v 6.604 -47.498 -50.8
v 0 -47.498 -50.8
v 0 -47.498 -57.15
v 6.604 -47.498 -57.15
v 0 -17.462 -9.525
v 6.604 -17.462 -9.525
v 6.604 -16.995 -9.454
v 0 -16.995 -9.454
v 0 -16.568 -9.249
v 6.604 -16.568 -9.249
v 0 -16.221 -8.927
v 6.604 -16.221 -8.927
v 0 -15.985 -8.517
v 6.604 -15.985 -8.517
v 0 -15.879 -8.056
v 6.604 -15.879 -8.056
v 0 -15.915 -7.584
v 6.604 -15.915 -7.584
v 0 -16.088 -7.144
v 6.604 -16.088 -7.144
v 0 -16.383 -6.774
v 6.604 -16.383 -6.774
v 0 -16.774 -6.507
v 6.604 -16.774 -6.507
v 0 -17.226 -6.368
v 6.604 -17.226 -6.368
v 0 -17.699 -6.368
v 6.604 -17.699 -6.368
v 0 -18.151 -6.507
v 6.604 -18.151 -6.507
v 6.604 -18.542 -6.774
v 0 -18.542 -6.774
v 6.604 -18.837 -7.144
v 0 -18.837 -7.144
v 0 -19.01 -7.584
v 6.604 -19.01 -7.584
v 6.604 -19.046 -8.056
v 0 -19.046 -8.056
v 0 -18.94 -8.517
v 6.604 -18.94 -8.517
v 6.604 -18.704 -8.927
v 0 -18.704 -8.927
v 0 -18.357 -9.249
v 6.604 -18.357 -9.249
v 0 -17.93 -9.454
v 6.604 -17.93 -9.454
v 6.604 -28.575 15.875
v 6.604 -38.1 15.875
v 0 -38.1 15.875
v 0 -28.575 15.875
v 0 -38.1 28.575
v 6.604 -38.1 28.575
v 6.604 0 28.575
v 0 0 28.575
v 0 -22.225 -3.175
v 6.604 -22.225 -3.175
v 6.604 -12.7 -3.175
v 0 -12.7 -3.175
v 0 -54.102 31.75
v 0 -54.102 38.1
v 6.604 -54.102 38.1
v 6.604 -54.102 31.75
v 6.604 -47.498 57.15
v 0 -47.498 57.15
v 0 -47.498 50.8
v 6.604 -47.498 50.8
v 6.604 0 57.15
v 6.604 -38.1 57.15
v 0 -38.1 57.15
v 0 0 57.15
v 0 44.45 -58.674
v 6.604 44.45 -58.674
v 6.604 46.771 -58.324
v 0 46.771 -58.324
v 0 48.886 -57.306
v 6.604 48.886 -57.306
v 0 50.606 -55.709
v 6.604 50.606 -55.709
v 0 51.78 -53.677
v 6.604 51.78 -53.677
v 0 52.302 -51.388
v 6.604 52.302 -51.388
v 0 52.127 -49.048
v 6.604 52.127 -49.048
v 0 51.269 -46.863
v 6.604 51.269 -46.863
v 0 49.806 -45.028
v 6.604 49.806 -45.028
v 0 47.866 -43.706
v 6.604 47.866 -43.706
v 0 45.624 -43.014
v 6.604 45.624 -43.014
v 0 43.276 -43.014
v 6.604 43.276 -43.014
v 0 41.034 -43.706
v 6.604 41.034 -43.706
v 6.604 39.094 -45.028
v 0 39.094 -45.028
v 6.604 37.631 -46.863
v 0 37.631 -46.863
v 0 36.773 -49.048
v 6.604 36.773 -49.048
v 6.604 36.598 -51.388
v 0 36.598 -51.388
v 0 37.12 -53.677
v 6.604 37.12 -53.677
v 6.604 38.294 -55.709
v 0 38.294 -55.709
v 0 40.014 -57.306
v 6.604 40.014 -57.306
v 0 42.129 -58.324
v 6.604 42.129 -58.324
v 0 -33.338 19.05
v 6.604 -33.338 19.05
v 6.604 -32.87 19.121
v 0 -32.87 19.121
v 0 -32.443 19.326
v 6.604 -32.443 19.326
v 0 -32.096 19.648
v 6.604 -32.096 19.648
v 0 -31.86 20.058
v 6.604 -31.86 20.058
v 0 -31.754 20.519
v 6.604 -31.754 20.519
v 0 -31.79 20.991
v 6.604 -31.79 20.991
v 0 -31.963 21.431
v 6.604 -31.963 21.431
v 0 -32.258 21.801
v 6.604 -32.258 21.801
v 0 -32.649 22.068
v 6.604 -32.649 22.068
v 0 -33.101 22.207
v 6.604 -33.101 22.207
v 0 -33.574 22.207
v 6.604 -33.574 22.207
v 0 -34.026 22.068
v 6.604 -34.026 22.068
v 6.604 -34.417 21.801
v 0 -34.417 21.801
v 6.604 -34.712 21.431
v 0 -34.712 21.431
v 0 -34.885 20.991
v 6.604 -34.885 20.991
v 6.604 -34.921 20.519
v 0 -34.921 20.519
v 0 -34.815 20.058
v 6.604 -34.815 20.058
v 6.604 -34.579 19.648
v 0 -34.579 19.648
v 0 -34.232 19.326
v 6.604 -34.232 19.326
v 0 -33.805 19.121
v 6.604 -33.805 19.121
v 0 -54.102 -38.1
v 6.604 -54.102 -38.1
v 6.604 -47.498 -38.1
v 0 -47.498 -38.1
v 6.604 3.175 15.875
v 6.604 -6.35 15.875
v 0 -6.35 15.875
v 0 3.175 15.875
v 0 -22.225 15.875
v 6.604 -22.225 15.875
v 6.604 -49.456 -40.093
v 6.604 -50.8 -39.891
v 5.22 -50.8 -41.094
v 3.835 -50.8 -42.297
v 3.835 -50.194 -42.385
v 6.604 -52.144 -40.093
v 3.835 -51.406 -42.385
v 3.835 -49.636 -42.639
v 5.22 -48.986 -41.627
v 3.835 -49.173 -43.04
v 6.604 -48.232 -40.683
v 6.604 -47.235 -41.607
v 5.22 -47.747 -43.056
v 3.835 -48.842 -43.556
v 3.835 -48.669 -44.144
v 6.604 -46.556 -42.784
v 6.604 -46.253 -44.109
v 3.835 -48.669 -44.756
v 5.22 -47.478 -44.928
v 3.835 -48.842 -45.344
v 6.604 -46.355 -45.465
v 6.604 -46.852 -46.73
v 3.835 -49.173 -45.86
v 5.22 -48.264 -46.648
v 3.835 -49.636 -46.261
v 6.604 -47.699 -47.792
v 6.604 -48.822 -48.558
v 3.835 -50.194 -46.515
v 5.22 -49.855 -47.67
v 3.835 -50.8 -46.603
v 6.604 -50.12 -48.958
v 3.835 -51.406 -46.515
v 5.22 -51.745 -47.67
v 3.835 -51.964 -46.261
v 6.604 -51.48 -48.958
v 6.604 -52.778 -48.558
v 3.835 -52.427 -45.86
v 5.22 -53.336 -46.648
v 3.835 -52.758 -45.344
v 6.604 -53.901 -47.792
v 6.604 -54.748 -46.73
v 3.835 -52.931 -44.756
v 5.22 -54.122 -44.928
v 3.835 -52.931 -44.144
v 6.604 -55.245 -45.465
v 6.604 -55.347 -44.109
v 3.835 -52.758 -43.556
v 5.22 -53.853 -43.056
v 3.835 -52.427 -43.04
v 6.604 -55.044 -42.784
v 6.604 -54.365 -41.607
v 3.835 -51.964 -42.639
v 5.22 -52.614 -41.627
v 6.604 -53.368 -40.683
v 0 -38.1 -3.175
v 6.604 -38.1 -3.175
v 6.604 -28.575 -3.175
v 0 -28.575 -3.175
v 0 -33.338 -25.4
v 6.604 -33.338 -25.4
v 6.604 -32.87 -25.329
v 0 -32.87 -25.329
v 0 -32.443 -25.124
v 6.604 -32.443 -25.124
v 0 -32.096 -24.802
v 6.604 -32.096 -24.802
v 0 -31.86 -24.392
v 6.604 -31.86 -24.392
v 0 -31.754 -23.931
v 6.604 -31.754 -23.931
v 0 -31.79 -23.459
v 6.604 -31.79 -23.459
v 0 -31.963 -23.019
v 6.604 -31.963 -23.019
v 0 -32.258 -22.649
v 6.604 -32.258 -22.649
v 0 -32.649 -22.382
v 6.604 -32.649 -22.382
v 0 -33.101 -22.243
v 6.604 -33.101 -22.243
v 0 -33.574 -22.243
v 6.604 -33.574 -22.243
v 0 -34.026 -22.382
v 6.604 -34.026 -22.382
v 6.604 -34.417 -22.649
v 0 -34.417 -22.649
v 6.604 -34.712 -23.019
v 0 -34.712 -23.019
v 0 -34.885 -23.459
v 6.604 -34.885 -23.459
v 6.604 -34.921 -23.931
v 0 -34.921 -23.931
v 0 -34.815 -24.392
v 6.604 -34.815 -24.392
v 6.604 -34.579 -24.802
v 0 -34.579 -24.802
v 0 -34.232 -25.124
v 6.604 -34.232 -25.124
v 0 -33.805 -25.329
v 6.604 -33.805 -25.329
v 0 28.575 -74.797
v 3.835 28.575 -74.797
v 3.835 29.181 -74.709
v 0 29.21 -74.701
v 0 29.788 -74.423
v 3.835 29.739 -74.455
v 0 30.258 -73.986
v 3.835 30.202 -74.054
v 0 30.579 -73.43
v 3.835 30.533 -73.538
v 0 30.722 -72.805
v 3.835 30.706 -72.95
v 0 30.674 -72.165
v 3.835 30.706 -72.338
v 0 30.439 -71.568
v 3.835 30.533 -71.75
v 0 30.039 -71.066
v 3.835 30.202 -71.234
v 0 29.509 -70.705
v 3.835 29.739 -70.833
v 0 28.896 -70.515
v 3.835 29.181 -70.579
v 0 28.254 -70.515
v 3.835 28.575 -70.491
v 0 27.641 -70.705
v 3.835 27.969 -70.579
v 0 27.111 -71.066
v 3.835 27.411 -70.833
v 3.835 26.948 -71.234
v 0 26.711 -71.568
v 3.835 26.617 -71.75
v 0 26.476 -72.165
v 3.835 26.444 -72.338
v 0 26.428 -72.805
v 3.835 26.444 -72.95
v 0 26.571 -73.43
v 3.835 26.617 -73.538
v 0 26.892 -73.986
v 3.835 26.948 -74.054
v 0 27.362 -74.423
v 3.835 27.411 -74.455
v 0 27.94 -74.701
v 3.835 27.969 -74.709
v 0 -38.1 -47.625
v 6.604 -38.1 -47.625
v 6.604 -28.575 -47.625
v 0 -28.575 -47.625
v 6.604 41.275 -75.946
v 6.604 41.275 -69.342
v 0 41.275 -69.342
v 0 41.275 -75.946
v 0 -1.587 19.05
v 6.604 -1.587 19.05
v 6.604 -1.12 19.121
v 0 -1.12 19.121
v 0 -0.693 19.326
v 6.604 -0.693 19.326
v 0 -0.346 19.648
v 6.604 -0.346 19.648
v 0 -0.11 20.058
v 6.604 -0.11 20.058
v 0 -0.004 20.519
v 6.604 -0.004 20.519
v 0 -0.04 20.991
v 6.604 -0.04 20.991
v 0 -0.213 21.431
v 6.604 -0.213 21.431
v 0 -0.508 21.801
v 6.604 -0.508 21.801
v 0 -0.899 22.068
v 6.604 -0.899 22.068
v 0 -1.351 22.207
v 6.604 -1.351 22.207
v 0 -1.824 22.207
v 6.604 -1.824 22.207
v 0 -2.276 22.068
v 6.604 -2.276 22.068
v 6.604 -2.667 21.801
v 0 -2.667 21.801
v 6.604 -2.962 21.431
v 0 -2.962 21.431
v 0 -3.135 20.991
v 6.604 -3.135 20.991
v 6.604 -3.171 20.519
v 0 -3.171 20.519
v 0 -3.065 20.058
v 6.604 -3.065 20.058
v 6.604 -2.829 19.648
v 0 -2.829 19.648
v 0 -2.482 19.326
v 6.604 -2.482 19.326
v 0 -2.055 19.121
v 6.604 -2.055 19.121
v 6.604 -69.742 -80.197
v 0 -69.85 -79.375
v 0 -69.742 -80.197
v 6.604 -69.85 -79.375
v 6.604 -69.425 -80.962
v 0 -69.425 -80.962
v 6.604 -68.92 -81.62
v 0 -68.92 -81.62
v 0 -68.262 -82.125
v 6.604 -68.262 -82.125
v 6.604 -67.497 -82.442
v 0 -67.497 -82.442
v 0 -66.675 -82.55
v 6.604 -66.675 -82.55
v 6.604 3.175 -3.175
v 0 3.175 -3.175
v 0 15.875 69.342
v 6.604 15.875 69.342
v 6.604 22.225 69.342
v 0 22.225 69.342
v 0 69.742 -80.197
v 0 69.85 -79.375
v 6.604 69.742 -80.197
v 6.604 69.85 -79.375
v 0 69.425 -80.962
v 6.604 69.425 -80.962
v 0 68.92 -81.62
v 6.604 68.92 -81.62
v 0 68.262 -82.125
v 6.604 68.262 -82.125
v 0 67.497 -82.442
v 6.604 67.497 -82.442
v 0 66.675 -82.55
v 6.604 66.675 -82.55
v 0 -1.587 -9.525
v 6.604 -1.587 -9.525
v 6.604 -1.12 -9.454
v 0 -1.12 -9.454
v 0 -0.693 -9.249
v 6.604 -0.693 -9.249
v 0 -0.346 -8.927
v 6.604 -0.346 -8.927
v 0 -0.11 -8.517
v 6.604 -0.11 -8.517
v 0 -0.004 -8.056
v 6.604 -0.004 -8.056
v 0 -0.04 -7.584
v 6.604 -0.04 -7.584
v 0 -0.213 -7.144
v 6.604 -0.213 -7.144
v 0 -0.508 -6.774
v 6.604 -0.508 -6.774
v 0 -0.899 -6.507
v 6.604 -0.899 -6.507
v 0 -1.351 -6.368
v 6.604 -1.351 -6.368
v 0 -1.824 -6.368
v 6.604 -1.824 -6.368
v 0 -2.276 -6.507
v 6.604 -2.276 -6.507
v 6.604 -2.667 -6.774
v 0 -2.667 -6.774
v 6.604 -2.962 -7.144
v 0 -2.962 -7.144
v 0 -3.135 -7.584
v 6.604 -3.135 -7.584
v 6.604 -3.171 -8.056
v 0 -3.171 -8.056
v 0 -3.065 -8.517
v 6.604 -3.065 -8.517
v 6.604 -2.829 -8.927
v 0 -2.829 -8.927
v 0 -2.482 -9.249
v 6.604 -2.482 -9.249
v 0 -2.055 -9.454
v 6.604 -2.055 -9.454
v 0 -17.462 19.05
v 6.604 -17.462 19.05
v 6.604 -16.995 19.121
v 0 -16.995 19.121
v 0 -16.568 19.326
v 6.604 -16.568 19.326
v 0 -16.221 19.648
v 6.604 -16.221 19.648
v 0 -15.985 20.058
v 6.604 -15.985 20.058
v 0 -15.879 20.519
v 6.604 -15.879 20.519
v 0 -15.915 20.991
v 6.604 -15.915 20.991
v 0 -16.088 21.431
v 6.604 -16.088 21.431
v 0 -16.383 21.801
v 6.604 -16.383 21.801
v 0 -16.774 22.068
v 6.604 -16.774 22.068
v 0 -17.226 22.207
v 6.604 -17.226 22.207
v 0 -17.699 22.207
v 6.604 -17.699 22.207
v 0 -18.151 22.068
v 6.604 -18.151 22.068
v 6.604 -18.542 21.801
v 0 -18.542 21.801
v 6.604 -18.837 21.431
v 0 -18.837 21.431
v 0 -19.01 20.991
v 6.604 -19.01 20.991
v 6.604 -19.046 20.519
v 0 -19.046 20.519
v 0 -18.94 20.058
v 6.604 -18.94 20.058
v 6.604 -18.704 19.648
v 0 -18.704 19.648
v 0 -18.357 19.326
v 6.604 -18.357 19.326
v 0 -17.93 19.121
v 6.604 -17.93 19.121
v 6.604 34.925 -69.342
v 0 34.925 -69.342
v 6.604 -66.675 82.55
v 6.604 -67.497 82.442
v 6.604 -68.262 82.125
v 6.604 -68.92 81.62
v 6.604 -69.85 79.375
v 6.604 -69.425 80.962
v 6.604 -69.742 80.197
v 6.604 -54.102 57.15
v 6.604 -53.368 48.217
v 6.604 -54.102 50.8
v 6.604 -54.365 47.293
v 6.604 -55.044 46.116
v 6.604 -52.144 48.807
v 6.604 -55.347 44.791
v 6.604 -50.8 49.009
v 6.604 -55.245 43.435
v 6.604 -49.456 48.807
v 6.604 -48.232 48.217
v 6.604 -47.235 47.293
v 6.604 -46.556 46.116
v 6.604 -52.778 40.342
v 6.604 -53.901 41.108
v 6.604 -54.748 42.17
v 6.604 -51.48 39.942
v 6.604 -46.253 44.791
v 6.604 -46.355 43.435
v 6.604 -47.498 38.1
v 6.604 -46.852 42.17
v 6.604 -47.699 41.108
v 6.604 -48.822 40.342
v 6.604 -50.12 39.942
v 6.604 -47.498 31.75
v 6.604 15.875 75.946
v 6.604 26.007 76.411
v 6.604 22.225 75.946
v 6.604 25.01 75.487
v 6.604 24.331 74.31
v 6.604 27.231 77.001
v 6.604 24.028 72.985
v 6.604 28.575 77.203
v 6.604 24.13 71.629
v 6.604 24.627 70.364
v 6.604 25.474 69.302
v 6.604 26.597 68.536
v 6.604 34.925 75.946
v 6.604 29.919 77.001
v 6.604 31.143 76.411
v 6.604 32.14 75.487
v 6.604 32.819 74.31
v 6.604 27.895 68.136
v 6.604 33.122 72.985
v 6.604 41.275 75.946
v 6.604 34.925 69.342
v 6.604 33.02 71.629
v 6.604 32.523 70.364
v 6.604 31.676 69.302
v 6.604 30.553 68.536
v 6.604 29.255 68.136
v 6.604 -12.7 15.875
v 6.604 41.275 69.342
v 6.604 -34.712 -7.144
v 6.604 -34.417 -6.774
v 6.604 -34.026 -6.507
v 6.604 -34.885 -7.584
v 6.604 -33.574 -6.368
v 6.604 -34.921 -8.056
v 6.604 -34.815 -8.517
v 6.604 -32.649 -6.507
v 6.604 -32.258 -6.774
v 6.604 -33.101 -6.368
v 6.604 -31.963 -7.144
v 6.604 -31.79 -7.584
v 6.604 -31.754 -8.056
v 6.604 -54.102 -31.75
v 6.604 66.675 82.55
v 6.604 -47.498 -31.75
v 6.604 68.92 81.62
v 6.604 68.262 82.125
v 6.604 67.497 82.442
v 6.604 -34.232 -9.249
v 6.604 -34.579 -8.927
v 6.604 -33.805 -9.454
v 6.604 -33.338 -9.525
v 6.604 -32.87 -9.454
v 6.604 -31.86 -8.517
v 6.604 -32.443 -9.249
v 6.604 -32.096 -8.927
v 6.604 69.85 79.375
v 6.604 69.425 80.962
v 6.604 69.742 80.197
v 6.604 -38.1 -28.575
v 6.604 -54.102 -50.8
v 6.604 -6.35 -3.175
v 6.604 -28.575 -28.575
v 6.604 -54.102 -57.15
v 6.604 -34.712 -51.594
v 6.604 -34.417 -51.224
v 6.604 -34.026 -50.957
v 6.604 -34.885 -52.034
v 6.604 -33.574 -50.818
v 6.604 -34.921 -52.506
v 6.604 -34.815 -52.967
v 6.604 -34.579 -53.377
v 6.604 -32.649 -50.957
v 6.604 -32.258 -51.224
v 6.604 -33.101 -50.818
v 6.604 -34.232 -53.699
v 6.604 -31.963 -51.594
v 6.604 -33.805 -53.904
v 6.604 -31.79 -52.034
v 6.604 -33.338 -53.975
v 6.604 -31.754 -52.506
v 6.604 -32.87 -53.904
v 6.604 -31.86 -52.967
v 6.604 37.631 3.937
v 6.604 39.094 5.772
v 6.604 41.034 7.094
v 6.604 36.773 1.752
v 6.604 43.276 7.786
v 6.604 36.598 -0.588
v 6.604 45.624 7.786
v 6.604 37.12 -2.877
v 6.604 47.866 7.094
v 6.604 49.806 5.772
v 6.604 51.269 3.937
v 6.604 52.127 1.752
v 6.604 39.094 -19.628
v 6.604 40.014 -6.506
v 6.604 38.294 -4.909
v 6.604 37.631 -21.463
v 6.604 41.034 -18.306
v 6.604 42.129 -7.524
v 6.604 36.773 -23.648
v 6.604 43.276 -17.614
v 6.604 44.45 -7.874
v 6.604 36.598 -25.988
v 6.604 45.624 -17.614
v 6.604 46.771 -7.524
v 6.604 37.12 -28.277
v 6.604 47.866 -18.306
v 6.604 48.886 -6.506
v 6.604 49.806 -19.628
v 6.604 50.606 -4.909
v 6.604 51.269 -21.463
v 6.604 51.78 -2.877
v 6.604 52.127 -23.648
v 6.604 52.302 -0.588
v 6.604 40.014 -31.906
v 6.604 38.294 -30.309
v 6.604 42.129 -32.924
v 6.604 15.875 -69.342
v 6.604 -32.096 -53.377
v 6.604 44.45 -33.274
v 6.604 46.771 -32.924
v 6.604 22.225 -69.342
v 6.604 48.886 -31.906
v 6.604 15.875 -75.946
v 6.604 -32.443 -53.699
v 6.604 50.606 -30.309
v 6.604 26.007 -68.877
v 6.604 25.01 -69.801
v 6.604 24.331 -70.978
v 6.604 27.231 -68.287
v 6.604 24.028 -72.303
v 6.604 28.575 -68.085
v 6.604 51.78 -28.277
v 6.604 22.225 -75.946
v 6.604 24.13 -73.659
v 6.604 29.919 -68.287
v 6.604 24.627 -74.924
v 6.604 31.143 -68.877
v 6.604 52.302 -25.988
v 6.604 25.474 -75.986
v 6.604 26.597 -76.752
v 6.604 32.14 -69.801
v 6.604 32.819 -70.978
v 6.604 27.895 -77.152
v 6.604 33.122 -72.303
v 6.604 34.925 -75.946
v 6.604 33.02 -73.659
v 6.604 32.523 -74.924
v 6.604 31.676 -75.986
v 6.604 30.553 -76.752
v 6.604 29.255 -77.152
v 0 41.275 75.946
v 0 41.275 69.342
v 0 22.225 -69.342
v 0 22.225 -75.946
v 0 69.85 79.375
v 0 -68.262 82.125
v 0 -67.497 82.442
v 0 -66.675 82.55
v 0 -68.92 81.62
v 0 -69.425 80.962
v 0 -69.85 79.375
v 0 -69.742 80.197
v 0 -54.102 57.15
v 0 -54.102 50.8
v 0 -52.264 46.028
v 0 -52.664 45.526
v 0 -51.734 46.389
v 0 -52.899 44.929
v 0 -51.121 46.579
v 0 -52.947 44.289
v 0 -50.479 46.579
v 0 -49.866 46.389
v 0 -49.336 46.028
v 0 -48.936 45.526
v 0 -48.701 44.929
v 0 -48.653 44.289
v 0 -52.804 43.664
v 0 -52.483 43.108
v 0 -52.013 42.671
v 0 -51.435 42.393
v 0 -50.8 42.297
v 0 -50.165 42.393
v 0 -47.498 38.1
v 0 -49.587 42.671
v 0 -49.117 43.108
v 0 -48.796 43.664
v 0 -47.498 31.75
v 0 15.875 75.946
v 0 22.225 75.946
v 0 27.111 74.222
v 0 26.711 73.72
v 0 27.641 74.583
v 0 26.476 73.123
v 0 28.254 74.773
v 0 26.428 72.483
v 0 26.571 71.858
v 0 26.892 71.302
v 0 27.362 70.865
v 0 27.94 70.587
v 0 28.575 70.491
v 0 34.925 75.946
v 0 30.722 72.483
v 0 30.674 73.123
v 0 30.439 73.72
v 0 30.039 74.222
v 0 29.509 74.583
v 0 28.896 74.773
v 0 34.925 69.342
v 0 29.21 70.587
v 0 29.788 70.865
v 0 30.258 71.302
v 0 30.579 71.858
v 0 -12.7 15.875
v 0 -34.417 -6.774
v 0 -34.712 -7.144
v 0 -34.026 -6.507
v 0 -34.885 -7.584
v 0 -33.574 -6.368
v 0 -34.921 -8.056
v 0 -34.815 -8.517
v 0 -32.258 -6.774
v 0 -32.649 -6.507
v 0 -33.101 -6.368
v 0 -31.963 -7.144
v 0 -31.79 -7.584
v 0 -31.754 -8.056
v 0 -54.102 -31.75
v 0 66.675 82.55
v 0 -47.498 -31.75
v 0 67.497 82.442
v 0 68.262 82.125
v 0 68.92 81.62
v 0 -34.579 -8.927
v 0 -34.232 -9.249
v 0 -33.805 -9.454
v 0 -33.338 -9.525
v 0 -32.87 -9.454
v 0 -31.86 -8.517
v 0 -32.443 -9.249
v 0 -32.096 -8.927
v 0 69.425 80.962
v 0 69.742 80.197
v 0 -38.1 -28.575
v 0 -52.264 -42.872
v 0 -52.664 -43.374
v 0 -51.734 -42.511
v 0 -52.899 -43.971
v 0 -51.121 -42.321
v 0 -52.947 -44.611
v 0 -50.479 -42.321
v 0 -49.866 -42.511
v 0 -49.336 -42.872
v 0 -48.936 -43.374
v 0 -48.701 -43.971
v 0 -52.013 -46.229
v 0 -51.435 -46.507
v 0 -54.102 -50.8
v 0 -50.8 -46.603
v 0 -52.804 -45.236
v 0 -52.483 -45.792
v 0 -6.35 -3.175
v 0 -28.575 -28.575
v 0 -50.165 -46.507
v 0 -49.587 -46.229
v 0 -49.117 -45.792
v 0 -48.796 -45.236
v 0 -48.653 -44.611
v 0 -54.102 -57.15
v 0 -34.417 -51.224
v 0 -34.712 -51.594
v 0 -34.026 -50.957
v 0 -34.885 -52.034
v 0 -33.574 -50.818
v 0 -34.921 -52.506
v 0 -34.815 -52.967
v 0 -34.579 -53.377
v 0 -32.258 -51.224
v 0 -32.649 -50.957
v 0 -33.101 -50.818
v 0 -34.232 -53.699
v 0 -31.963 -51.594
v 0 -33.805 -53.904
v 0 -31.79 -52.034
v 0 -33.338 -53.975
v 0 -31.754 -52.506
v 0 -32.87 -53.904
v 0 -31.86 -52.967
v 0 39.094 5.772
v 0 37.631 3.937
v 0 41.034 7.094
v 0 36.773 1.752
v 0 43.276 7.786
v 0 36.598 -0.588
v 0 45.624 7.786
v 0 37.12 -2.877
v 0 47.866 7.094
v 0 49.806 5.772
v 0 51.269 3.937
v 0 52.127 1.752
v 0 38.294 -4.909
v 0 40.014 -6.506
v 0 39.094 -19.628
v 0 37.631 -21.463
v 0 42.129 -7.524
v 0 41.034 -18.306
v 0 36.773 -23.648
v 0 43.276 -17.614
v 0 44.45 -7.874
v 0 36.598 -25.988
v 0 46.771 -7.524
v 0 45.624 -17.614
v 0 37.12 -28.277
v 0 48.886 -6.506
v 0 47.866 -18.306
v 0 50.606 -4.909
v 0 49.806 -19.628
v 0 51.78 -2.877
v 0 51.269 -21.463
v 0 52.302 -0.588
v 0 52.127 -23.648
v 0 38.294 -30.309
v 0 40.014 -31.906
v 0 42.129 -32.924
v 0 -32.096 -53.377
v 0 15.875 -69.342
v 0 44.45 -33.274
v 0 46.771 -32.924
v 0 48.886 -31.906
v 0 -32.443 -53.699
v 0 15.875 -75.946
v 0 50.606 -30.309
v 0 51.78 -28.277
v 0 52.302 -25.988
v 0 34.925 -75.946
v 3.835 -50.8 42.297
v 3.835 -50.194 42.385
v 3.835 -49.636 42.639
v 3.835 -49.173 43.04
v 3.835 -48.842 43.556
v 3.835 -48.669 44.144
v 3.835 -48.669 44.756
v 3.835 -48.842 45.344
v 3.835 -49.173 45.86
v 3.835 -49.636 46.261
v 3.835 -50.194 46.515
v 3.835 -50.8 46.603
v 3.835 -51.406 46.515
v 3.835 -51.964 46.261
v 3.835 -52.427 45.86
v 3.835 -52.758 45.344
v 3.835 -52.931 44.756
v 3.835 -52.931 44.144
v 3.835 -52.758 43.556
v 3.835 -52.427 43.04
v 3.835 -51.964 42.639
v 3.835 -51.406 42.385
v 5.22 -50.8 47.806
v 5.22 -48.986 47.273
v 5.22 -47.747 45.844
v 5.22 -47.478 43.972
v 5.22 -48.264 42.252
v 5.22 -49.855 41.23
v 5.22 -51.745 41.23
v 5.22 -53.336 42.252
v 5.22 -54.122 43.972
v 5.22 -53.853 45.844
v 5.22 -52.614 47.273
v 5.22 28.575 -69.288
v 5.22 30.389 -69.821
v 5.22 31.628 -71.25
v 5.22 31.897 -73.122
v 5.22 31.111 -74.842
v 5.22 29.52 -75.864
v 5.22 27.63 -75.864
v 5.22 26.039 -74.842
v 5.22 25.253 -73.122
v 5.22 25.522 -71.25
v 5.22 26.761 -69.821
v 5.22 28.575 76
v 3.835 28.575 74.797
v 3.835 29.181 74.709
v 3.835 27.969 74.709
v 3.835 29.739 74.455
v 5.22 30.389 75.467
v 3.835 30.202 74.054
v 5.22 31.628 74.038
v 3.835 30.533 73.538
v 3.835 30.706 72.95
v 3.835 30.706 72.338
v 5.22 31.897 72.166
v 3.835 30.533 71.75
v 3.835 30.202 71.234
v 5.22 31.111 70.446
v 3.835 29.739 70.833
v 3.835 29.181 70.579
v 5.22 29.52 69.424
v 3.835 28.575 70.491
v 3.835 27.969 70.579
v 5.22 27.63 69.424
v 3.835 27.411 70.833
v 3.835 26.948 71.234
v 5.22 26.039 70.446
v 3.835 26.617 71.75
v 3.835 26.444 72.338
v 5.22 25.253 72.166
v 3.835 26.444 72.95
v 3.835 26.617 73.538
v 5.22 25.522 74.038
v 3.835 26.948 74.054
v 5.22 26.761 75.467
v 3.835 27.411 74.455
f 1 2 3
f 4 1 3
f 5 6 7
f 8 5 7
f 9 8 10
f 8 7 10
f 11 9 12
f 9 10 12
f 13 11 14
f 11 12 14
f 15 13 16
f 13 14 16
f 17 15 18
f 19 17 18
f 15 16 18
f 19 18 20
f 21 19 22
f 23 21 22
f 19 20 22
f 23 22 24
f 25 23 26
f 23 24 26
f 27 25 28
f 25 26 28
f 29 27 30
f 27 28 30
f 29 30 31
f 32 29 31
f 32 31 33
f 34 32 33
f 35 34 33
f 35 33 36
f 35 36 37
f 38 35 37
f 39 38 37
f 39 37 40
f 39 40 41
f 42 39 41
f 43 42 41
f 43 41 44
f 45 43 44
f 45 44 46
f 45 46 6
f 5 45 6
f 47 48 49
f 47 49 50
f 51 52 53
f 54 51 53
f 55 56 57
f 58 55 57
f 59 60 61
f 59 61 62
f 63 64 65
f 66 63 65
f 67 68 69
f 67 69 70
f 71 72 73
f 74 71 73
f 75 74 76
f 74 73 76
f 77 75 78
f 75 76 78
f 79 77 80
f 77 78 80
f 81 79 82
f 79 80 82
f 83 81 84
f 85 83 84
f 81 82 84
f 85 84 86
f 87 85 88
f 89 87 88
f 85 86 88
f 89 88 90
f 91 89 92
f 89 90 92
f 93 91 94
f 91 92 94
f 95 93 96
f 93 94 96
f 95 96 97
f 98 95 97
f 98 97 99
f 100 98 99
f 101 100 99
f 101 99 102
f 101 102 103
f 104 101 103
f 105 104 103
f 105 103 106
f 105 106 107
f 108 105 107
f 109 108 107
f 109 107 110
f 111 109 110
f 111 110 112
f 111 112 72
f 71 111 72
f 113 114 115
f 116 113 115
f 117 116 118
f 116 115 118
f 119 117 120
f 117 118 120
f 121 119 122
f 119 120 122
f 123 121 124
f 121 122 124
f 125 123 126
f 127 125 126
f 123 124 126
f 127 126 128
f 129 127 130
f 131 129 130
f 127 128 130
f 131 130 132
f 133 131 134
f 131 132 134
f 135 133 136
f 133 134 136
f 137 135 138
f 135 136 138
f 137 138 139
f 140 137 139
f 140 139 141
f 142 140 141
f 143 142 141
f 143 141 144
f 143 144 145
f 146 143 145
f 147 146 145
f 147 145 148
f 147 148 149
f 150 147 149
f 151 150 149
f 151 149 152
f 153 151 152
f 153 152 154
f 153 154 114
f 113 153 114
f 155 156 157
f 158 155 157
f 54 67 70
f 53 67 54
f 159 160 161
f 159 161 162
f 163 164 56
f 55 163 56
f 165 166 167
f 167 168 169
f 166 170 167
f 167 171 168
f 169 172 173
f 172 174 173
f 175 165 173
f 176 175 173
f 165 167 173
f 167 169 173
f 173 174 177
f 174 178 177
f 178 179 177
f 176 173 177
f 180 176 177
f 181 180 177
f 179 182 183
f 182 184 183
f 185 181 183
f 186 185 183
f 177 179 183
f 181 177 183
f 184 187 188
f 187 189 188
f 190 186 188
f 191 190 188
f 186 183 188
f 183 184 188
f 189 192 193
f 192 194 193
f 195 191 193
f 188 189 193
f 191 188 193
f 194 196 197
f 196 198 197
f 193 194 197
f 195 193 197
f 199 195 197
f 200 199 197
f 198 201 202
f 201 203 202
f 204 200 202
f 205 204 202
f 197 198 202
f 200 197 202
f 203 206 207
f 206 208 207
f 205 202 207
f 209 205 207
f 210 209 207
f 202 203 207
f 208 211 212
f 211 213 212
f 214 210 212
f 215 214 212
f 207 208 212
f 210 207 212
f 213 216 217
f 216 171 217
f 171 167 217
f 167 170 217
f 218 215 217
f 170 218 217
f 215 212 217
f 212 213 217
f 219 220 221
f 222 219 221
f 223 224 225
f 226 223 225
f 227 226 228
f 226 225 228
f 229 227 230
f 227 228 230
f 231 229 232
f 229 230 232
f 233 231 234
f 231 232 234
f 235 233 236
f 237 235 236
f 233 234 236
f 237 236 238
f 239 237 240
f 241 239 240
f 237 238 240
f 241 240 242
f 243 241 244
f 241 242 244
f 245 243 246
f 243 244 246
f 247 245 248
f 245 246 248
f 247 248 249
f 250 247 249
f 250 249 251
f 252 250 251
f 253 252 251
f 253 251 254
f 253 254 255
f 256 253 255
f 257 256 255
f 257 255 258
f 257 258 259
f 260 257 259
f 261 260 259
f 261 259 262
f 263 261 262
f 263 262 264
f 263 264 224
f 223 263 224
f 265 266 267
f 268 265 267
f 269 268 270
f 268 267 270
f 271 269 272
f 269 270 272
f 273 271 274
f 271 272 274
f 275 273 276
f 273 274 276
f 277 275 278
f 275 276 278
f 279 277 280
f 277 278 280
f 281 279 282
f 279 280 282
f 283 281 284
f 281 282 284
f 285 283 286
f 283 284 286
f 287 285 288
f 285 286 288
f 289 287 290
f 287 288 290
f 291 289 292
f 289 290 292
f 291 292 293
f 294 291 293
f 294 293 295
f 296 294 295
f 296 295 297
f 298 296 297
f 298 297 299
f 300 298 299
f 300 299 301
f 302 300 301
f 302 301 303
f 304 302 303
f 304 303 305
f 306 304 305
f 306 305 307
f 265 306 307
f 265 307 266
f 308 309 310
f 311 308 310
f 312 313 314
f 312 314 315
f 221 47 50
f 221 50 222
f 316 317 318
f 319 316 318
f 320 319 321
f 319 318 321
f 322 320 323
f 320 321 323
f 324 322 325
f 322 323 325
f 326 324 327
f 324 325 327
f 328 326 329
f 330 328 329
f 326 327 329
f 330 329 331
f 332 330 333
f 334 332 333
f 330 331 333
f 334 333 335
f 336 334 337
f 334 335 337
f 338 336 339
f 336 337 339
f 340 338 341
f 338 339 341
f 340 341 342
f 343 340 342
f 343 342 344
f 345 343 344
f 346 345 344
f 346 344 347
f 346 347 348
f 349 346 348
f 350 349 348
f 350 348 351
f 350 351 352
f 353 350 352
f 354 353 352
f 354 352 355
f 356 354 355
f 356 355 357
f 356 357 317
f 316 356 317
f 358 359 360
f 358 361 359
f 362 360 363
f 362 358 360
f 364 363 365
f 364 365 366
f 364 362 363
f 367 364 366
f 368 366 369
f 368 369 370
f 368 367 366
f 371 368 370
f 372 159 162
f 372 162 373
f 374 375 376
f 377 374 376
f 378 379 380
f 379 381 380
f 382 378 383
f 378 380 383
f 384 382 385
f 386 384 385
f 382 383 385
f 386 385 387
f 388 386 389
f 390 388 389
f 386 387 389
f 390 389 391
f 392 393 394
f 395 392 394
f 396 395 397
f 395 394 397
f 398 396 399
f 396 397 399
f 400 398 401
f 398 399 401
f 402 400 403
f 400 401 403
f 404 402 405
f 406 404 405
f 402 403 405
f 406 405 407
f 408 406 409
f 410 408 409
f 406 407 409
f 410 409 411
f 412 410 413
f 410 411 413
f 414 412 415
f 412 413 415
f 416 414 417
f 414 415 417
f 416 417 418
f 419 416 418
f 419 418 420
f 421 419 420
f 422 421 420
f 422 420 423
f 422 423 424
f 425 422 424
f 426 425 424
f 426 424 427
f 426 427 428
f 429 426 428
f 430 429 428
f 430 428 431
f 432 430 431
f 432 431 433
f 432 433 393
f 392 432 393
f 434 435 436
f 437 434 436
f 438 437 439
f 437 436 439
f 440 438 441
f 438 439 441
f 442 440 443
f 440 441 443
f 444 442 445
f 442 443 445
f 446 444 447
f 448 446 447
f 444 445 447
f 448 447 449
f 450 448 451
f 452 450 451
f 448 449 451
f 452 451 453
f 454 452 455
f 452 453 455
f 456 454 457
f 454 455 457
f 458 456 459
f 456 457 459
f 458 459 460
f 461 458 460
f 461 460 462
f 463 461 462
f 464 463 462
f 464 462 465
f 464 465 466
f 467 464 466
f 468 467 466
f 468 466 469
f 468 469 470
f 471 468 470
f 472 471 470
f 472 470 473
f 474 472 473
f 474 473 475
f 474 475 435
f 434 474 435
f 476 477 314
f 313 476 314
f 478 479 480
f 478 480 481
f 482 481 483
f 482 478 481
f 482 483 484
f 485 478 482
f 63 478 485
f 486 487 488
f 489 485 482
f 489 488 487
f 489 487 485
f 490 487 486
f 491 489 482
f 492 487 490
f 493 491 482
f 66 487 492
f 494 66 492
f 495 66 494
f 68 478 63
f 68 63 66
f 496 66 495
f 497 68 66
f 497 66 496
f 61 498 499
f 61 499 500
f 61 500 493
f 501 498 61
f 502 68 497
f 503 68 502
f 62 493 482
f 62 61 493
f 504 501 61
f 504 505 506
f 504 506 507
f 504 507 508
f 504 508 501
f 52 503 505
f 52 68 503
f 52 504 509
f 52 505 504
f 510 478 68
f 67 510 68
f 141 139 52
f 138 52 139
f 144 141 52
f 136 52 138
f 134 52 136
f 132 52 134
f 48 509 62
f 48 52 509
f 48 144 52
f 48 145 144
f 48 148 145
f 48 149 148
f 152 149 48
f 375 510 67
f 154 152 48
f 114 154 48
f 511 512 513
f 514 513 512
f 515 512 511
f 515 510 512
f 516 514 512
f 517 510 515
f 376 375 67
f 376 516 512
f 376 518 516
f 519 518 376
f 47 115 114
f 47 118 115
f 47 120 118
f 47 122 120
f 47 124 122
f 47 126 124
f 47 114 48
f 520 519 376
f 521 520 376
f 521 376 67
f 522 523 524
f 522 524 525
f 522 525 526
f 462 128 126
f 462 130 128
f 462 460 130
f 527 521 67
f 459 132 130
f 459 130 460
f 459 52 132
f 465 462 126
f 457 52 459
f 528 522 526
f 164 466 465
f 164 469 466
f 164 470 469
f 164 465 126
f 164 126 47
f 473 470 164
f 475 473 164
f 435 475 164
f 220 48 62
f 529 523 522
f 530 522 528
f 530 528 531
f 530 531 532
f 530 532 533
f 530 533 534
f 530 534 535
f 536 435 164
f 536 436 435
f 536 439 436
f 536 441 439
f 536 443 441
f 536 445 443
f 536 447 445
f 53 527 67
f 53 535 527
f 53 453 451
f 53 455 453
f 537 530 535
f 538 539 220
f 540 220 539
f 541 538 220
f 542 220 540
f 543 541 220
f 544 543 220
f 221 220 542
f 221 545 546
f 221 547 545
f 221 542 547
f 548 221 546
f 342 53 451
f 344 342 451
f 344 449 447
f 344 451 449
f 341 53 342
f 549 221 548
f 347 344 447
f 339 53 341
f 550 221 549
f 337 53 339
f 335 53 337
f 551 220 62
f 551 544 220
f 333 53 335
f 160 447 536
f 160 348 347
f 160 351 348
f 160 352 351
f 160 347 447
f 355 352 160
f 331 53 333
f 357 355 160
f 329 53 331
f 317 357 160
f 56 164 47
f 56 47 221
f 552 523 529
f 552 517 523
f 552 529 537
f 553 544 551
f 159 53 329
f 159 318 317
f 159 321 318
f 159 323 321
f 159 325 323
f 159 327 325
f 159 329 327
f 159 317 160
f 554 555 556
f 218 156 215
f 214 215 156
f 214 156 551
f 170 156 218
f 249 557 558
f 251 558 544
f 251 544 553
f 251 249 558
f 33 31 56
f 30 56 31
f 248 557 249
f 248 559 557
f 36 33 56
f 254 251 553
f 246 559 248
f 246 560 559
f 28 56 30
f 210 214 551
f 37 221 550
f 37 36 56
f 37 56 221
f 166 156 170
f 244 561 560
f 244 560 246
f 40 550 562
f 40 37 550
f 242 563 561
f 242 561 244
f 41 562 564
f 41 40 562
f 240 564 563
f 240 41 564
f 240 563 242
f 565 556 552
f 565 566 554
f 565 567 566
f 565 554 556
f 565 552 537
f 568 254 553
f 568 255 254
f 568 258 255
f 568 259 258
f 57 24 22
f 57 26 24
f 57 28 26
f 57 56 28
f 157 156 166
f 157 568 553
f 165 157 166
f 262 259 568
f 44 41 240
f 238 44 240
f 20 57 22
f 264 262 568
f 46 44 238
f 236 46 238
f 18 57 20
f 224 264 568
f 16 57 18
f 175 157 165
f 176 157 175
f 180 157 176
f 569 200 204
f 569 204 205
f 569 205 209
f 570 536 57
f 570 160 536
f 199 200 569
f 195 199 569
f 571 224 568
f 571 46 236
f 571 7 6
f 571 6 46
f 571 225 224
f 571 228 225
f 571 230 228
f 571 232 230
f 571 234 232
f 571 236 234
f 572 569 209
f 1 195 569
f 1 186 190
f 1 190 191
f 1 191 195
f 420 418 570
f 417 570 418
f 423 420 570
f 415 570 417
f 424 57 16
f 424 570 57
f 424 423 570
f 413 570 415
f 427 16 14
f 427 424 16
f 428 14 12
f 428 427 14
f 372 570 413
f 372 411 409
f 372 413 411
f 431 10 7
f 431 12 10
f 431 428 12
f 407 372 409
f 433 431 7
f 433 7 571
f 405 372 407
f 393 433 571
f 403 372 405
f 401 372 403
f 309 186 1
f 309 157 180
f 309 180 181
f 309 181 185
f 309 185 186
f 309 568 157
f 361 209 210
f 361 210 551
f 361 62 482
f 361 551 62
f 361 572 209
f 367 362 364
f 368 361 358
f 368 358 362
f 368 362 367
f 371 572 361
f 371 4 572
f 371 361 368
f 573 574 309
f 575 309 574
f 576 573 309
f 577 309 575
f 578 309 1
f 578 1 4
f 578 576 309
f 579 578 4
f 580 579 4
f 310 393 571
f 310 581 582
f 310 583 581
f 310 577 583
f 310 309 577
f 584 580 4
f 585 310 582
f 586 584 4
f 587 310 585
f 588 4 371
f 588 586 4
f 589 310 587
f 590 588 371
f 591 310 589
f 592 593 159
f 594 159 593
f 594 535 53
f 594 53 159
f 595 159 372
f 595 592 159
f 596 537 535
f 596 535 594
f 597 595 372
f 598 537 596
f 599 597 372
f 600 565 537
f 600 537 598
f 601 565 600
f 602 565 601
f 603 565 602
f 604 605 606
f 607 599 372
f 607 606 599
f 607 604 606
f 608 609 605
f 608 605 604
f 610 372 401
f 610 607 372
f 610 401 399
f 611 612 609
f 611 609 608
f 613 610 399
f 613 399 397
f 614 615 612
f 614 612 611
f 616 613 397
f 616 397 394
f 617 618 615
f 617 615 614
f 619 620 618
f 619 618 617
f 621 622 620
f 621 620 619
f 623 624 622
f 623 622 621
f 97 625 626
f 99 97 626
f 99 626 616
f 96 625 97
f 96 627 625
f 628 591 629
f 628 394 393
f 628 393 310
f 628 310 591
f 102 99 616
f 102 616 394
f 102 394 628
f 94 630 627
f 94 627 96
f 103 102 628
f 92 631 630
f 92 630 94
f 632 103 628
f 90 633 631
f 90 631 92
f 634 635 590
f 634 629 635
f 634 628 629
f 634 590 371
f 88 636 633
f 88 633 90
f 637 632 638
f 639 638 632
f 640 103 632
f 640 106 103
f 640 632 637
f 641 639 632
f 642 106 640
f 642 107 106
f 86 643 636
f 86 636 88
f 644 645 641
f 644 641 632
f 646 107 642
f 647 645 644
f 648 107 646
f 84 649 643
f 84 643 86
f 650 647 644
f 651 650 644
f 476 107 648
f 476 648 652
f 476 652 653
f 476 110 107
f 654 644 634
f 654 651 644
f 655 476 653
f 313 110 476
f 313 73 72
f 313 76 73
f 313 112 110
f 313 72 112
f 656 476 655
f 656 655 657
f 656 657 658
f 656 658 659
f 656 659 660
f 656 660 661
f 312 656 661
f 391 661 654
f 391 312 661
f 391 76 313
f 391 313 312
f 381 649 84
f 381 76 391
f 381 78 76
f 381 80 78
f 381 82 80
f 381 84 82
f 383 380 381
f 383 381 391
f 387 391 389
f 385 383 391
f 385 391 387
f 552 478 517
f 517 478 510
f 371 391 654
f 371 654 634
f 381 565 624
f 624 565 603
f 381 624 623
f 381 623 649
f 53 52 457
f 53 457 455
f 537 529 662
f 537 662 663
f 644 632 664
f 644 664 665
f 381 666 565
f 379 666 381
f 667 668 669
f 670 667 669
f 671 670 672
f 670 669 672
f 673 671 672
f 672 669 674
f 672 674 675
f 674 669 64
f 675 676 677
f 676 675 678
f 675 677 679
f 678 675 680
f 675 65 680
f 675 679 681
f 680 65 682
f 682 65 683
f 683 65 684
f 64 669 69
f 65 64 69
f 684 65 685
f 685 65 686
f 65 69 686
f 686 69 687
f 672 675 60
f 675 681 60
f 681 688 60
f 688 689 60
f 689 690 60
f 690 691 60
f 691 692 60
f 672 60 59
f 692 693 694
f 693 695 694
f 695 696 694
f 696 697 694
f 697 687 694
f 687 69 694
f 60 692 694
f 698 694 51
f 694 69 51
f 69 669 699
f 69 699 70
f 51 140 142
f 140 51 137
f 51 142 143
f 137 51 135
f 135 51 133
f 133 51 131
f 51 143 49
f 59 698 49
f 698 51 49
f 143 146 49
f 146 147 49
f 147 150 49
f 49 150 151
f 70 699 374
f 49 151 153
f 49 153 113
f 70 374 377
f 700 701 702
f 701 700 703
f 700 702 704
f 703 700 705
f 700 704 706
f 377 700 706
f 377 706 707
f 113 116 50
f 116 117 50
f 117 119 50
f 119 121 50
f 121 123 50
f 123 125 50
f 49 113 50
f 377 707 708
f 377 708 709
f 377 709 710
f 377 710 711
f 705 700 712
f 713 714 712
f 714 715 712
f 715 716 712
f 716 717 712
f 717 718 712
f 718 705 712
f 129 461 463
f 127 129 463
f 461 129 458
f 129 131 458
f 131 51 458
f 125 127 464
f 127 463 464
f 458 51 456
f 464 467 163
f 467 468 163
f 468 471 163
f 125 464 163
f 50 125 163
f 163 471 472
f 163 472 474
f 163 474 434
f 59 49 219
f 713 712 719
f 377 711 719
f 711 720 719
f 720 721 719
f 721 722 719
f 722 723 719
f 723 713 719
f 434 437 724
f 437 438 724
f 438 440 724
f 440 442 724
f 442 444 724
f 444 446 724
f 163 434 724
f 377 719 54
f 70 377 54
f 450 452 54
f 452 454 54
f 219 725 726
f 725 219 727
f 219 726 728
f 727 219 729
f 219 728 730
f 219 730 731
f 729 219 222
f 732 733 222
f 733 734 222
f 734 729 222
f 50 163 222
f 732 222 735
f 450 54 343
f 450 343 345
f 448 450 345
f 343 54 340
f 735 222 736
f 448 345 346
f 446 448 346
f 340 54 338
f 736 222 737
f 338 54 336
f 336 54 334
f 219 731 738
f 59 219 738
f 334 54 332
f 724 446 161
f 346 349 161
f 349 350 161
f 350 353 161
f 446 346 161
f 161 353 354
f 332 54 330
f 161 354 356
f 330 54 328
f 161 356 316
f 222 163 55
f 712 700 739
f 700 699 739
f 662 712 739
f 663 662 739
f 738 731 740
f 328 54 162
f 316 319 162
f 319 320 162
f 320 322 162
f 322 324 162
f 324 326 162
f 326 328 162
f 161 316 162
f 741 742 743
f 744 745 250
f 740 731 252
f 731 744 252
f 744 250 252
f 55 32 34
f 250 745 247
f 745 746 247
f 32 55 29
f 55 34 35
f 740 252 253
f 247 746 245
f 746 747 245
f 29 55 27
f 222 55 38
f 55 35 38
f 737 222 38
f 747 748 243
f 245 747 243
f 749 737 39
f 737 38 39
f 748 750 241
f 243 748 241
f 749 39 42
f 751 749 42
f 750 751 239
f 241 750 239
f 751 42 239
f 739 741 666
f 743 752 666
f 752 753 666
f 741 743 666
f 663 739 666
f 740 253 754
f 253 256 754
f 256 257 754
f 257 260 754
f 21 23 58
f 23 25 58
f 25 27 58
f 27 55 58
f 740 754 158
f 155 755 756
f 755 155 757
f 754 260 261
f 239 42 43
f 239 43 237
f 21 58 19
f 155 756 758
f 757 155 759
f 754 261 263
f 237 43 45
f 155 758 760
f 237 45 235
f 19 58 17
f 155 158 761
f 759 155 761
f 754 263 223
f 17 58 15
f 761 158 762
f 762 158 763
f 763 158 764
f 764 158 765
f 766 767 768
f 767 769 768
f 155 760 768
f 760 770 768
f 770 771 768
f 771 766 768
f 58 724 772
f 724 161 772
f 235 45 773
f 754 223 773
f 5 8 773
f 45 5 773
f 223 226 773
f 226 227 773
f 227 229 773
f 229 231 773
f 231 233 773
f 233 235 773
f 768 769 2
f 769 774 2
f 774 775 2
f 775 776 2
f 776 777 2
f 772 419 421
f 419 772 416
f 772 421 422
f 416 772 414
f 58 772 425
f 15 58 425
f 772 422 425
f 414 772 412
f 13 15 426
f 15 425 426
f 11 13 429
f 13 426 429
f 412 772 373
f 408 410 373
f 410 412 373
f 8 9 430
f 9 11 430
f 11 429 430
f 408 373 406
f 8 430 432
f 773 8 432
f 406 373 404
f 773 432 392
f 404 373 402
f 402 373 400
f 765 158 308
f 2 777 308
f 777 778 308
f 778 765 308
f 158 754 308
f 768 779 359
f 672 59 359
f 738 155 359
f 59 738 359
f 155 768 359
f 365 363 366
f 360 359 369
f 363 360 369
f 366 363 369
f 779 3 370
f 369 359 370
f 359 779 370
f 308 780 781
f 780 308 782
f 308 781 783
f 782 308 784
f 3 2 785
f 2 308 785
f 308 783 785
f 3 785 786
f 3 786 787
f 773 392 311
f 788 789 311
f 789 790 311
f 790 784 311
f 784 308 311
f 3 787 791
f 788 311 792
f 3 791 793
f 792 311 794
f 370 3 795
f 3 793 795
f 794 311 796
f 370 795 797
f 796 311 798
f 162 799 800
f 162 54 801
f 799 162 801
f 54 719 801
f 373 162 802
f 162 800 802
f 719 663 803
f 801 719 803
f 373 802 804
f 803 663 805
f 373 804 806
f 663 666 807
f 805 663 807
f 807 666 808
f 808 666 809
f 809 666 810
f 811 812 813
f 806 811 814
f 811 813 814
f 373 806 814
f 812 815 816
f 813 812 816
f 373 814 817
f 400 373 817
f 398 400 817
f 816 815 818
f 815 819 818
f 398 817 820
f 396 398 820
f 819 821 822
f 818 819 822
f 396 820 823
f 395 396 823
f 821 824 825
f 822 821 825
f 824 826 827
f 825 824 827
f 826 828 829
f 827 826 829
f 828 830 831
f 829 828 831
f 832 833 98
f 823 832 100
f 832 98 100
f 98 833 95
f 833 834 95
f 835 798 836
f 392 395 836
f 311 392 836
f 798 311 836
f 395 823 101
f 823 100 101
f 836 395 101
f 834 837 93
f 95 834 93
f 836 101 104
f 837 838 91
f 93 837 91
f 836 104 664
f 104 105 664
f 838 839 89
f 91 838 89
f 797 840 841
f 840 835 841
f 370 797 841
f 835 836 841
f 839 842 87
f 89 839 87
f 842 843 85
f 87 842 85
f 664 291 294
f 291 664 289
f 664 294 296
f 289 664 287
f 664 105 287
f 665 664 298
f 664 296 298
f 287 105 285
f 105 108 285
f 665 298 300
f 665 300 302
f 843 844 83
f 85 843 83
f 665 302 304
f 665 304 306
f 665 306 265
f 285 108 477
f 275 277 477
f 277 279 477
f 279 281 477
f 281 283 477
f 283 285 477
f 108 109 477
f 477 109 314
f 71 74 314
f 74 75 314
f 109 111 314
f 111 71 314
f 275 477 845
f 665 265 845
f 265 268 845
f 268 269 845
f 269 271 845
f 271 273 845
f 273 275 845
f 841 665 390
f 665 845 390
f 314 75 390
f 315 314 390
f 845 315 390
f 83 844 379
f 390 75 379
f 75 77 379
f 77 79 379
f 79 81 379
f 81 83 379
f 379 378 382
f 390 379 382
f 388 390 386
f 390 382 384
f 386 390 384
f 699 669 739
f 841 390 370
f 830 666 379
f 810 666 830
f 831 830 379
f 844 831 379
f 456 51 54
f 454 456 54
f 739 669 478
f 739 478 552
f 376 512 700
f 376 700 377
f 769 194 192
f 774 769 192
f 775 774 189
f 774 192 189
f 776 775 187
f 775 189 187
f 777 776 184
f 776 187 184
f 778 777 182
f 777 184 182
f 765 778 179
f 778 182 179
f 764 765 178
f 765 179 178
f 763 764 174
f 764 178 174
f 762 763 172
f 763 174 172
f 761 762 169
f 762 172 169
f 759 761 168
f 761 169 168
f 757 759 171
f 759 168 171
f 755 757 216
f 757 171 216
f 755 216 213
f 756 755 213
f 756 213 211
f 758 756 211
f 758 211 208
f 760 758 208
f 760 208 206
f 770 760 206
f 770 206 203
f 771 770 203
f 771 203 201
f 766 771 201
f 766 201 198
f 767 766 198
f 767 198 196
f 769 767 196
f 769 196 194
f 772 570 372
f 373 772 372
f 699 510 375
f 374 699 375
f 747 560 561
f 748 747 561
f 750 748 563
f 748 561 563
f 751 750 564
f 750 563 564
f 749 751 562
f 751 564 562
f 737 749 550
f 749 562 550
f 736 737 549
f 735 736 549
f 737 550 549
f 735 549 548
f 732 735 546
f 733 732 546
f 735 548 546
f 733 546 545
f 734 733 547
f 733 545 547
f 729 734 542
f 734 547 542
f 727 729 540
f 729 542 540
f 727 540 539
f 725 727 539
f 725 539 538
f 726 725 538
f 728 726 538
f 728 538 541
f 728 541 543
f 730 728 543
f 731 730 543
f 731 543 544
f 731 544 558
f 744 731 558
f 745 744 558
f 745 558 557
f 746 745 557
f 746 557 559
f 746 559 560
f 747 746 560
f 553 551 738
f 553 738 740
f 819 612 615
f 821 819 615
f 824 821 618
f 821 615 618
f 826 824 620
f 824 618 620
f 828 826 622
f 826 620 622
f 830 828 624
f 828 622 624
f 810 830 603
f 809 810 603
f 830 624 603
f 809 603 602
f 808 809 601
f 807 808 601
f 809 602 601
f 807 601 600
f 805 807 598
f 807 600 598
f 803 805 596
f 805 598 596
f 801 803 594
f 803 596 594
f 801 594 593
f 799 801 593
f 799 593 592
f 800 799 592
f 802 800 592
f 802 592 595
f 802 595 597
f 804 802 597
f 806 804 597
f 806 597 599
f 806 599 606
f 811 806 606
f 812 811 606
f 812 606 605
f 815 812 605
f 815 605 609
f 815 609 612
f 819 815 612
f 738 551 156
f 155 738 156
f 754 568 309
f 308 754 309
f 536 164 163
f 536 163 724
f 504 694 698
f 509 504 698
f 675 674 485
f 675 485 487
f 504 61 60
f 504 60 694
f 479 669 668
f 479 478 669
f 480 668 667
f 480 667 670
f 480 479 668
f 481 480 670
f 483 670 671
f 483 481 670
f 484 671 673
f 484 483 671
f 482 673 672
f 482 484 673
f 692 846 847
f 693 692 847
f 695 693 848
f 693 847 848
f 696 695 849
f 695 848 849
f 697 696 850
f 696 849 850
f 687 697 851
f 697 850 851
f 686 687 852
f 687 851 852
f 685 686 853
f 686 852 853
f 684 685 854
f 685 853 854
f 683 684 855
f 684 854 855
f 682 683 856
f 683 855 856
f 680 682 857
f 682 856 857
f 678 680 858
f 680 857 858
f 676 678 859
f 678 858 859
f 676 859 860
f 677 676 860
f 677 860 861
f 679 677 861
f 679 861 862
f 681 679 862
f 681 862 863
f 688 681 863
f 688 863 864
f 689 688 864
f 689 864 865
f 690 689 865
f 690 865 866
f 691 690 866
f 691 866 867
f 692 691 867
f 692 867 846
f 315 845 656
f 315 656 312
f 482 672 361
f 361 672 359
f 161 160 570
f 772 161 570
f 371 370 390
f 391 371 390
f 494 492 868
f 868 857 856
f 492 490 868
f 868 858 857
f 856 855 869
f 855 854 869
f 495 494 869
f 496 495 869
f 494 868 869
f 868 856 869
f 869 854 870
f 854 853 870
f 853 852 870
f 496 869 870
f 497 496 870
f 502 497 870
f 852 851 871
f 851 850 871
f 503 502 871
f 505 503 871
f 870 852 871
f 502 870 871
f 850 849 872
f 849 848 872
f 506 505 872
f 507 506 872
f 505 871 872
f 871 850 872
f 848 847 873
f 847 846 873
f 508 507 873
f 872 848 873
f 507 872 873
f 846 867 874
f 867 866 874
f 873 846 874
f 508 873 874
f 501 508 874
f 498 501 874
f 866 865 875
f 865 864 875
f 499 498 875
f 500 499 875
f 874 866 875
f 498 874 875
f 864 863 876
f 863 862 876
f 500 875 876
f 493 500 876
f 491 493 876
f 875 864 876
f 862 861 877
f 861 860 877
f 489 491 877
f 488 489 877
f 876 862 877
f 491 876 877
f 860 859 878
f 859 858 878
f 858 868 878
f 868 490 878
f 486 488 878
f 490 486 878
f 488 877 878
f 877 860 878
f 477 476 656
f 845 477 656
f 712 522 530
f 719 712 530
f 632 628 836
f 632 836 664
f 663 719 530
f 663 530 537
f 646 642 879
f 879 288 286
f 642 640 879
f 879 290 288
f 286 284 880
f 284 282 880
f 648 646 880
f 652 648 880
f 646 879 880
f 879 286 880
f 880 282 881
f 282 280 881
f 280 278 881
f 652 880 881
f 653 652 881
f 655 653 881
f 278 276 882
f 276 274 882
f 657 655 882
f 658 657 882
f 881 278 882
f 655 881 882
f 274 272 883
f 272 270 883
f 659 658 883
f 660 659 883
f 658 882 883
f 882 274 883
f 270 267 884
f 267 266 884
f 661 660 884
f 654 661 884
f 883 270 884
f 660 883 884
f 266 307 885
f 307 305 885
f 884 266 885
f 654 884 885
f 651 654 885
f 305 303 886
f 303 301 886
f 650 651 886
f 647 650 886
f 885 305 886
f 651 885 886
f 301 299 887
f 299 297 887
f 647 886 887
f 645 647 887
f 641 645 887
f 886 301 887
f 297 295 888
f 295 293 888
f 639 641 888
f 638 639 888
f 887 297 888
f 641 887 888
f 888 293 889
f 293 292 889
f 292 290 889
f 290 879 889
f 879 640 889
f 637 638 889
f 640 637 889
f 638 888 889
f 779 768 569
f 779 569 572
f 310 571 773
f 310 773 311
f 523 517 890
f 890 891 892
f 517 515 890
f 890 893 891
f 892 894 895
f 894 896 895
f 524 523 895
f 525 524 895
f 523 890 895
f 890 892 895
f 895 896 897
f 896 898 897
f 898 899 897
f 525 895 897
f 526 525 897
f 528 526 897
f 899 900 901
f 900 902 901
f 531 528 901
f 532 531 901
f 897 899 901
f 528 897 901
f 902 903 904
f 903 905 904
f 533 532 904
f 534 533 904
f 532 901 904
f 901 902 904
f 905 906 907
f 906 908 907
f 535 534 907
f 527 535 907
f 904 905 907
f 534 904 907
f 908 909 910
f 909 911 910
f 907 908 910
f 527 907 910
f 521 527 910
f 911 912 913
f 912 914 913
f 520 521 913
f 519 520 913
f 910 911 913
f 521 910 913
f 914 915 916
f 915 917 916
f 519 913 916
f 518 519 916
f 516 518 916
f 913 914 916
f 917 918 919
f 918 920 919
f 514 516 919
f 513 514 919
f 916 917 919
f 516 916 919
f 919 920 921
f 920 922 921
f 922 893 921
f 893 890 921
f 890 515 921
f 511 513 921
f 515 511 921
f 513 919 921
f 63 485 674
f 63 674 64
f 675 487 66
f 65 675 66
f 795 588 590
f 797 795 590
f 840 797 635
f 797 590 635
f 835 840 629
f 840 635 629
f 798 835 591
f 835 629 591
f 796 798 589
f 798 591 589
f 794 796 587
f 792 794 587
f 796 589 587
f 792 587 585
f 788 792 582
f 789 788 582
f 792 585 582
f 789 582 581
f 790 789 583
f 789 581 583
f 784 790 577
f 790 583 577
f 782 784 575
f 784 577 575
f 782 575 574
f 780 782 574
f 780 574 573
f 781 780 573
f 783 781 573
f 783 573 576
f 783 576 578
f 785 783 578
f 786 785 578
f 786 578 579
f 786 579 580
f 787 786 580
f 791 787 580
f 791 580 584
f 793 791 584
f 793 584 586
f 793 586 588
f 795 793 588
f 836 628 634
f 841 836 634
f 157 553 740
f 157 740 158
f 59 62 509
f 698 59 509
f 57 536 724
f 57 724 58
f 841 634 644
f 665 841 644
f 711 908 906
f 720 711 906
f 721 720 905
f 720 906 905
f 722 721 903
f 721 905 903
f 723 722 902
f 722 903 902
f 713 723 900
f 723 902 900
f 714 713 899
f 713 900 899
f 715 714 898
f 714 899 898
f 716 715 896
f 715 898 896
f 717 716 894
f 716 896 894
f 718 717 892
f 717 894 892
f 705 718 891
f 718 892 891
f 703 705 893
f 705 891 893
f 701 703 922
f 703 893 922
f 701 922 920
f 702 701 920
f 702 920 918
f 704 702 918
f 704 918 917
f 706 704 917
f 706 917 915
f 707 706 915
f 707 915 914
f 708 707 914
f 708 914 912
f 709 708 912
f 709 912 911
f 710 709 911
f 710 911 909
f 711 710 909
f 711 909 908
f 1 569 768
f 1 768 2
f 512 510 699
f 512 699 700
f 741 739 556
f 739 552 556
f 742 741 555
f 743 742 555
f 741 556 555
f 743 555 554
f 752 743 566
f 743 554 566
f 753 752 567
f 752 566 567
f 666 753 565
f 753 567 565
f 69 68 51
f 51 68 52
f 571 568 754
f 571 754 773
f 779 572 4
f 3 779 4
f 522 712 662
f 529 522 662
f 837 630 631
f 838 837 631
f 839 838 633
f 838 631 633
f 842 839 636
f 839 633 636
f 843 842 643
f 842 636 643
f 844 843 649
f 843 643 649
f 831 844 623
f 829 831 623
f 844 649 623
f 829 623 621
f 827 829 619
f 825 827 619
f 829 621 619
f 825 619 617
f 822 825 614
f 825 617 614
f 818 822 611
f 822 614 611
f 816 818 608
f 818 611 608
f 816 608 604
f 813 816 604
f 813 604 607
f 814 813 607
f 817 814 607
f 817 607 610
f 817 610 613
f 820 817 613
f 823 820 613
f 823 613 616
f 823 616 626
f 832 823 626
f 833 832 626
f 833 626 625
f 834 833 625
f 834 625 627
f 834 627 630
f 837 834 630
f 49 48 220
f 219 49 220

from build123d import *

# Parameters (mm, degrees)
SKETCH1_W                                         = 165.1
SKETCH1_H                                         = 139.7
BOSS_EXTRUDE1_DEPTH                               = 6.604
SKETCH2_R                                         = 7.874
SKETCH2_W                                         = 28.575
SKETCH2_H                                         = 38.1
CUT_EXTRUDE1_DEPTH                                = 7.604
SKETCH3_R                                         = 2.15265
SKETCH3_W                                         = 6.35
SKETCH3_H                                         = 6.604
CUT_EXTRUDE2_DEPTH                                = 7.604
SKETCH4_R                                         = 1.5875
SKETCH4_W                                         = 19.05
SKETCH4_H                                         = 9.525
CUT_EXTRUDE3_DEPTH                                = 7.604
LPATTERN1_COUNT                                   = 3
LPATTERN1_PITCH                                   = 15.875
FILLET1_R                                         = 3.175
SKETCH5_R                                         = 2.15265
SKETCH5_W                                         = 6.604
SKETCH5_H                                         = 6.35
CUT_EXTRUDE4_DEPTH                                = 7.604
CSK_FOR_8_FLAT_HEAD_SOCKET_CAP_SCREW1_D           = 4.3053
CSK_FOR_8_FLAT_HEAD_SOCKET_CAP_SCREW1_CSINK_D     = 9.1186
CSK_FOR_8_FLAT_HEAD_SOCKET_CAP_SCREW1_CSINK_ANGLE = 82
LPATTERN2_COUNT                                   = 2
LPATTERN2_PITCH                                   = 44.45


with BuildPart() as part:
    # Sketch1 → Boss-Extrude1 (new body)
    with BuildSketch(Plane(origin=(0, 0, 0), x_dir=(0, 0, -1), z_dir=(1, 0, 0))):
        Rectangle(SKETCH1_W, SKETCH1_H)
    extrude(amount=BOSS_EXTRUDE1_DEPTH)

    # Sketch2 → Cut-Extrude1 (cut, through all)
    with BuildSketch(Plane(origin=(6.604, 0, 0), x_dir=(0, 0, -1), z_dir=(1, 0, 0))):
        with Locations((50.8, 44.45)):
            Circle(SKETCH2_R)
        with Locations((25.4, 44.45)):
            Circle(SKETCH2_R)
        with Locations((0, 44.45)):
            Circle(SKETCH2_R)
        with Locations((-42.8625, -19.05)):
            Rectangle(SKETCH2_W, SKETCH2_H)
    extrude(amount=-CUT_EXTRUDE1_DEPTH, mode=Mode.SUBTRACT)

    # Sketch3 → Cut-Extrude2 (cut, through all)
    with BuildSketch(Plane(origin=(6.604, 0, 0), x_dir=(0, 0, -1), z_dir=(1, 0, 0))):
        with Locations((-44.45, -50.8)):
            Circle(SKETCH3_R)
        with Locations((44.45, -50.8)):
            Circle(SKETCH3_R)
        with Locations((-34.925, -50.8)):
            Rectangle(SKETCH3_W, SKETCH3_H)
        with Locations((-53.975, -50.8)):
            Rectangle(SKETCH3_W, SKETCH3_H)
        with Locations((53.975, -50.8)):
            Rectangle(SKETCH3_W, SKETCH3_H)
        with Locations((34.925, -50.8)):
            Rectangle(SKETCH3_W, SKETCH3_H)
    extrude(amount=-CUT_EXTRUDE2_DEPTH, mode=Mode.SUBTRACT)

    # Sketch4 → Cut-Extrude3 (cut, through all)
    with BuildSketch(Plane(origin=(6.604, 0, 0), x_dir=(0, 0, -1), z_dir=(1, 0, 0))):
        with Locations((-20.6375, -33.3375)):
            Circle(SKETCH4_R)
        with Locations((7.9375, -33.3375)):
            Circle(SKETCH4_R)
        with Locations((-6.35, -33.3375)):
            Rectangle(SKETCH4_W, SKETCH4_H)
    cut_extrude3 = extrude(amount=-CUT_EXTRUDE3_DEPTH, mode=Mode.SUBTRACT)

    # LPattern1: Cut-Extrude3 ×3
    with Locations(*[(0, i * LPATTERN1_PITCH, 0) for i in range(1, LPATTERN1_COUNT)]):
        add(cut_extrude3, mode=Mode.SUBTRACT)

    # Fillet1
    fillet1_edges = [part.edges().sort_by_distance(p)[0] for p in [
        (3.302, 69.85, 82.55),
        (3.302, 69.85, -82.55),
        (3.302, -69.85, -82.55),
        (3.302, -69.85, 82.55),
    ]]
    fillet(fillet1_edges, radius=FILLET1_R)

    # Sketch5 → Cut-Extrude4 (cut, through all)
    with BuildSketch(Plane(origin=(6.604, 0, 0), x_dir=(0, 0, -1), z_dir=(1, 0, 0))):
        with Locations((72.644, 28.575)):
            Circle(SKETCH5_R)
        with Locations((-72.644, 28.575)):
            Circle(SKETCH5_R)
        with Locations((72.644, 19.05)):
            Rectangle(SKETCH5_W, SKETCH5_H)
        with Locations((72.644, 38.1)):
            Rectangle(SKETCH5_W, SKETCH5_H)
        with Locations((-72.644, 38.1)):
            Rectangle(SKETCH5_W, SKETCH5_H)
        with Locations((-72.644, 19.05)):
            Rectangle(SKETCH5_W, SKETCH5_H)
    extrude(amount=-CUT_EXTRUDE4_DEPTH, mode=Mode.SUBTRACT)

    # CSK for #8 Flat Head Socket Cap Screw1 (through all)
    with Locations(Plane(origin=(6.604, 0, 0), x_dir=(0, 0, -1), z_dir=(1, 0, 0))):
        with Locations((-72.644, 28.575), (-44.45, -50.8), (44.45, -50.8), (72.644, 28.575)):
            CounterSinkHole(CSK_FOR_8_FLAT_HEAD_SOCKET_CAP_SCREW1_D / 2, CSK_FOR_8_FLAT_HEAD_SOCKET_CAP_SCREW1_CSINK_D / 2, counter_sink_angle=CSK_FOR_8_FLAT_HEAD_SOCKET_CAP_SCREW1_CSINK_ANGLE)

    # LPattern2: Cut-Extrude3 ×2
    with Locations(*[(0, 0, -i * LPATTERN2_PITCH) for i in range(1, LPATTERN2_COUNT)]):
        add(cut_extrude3, mode=Mode.SUBTRACT)


solid = part.part
